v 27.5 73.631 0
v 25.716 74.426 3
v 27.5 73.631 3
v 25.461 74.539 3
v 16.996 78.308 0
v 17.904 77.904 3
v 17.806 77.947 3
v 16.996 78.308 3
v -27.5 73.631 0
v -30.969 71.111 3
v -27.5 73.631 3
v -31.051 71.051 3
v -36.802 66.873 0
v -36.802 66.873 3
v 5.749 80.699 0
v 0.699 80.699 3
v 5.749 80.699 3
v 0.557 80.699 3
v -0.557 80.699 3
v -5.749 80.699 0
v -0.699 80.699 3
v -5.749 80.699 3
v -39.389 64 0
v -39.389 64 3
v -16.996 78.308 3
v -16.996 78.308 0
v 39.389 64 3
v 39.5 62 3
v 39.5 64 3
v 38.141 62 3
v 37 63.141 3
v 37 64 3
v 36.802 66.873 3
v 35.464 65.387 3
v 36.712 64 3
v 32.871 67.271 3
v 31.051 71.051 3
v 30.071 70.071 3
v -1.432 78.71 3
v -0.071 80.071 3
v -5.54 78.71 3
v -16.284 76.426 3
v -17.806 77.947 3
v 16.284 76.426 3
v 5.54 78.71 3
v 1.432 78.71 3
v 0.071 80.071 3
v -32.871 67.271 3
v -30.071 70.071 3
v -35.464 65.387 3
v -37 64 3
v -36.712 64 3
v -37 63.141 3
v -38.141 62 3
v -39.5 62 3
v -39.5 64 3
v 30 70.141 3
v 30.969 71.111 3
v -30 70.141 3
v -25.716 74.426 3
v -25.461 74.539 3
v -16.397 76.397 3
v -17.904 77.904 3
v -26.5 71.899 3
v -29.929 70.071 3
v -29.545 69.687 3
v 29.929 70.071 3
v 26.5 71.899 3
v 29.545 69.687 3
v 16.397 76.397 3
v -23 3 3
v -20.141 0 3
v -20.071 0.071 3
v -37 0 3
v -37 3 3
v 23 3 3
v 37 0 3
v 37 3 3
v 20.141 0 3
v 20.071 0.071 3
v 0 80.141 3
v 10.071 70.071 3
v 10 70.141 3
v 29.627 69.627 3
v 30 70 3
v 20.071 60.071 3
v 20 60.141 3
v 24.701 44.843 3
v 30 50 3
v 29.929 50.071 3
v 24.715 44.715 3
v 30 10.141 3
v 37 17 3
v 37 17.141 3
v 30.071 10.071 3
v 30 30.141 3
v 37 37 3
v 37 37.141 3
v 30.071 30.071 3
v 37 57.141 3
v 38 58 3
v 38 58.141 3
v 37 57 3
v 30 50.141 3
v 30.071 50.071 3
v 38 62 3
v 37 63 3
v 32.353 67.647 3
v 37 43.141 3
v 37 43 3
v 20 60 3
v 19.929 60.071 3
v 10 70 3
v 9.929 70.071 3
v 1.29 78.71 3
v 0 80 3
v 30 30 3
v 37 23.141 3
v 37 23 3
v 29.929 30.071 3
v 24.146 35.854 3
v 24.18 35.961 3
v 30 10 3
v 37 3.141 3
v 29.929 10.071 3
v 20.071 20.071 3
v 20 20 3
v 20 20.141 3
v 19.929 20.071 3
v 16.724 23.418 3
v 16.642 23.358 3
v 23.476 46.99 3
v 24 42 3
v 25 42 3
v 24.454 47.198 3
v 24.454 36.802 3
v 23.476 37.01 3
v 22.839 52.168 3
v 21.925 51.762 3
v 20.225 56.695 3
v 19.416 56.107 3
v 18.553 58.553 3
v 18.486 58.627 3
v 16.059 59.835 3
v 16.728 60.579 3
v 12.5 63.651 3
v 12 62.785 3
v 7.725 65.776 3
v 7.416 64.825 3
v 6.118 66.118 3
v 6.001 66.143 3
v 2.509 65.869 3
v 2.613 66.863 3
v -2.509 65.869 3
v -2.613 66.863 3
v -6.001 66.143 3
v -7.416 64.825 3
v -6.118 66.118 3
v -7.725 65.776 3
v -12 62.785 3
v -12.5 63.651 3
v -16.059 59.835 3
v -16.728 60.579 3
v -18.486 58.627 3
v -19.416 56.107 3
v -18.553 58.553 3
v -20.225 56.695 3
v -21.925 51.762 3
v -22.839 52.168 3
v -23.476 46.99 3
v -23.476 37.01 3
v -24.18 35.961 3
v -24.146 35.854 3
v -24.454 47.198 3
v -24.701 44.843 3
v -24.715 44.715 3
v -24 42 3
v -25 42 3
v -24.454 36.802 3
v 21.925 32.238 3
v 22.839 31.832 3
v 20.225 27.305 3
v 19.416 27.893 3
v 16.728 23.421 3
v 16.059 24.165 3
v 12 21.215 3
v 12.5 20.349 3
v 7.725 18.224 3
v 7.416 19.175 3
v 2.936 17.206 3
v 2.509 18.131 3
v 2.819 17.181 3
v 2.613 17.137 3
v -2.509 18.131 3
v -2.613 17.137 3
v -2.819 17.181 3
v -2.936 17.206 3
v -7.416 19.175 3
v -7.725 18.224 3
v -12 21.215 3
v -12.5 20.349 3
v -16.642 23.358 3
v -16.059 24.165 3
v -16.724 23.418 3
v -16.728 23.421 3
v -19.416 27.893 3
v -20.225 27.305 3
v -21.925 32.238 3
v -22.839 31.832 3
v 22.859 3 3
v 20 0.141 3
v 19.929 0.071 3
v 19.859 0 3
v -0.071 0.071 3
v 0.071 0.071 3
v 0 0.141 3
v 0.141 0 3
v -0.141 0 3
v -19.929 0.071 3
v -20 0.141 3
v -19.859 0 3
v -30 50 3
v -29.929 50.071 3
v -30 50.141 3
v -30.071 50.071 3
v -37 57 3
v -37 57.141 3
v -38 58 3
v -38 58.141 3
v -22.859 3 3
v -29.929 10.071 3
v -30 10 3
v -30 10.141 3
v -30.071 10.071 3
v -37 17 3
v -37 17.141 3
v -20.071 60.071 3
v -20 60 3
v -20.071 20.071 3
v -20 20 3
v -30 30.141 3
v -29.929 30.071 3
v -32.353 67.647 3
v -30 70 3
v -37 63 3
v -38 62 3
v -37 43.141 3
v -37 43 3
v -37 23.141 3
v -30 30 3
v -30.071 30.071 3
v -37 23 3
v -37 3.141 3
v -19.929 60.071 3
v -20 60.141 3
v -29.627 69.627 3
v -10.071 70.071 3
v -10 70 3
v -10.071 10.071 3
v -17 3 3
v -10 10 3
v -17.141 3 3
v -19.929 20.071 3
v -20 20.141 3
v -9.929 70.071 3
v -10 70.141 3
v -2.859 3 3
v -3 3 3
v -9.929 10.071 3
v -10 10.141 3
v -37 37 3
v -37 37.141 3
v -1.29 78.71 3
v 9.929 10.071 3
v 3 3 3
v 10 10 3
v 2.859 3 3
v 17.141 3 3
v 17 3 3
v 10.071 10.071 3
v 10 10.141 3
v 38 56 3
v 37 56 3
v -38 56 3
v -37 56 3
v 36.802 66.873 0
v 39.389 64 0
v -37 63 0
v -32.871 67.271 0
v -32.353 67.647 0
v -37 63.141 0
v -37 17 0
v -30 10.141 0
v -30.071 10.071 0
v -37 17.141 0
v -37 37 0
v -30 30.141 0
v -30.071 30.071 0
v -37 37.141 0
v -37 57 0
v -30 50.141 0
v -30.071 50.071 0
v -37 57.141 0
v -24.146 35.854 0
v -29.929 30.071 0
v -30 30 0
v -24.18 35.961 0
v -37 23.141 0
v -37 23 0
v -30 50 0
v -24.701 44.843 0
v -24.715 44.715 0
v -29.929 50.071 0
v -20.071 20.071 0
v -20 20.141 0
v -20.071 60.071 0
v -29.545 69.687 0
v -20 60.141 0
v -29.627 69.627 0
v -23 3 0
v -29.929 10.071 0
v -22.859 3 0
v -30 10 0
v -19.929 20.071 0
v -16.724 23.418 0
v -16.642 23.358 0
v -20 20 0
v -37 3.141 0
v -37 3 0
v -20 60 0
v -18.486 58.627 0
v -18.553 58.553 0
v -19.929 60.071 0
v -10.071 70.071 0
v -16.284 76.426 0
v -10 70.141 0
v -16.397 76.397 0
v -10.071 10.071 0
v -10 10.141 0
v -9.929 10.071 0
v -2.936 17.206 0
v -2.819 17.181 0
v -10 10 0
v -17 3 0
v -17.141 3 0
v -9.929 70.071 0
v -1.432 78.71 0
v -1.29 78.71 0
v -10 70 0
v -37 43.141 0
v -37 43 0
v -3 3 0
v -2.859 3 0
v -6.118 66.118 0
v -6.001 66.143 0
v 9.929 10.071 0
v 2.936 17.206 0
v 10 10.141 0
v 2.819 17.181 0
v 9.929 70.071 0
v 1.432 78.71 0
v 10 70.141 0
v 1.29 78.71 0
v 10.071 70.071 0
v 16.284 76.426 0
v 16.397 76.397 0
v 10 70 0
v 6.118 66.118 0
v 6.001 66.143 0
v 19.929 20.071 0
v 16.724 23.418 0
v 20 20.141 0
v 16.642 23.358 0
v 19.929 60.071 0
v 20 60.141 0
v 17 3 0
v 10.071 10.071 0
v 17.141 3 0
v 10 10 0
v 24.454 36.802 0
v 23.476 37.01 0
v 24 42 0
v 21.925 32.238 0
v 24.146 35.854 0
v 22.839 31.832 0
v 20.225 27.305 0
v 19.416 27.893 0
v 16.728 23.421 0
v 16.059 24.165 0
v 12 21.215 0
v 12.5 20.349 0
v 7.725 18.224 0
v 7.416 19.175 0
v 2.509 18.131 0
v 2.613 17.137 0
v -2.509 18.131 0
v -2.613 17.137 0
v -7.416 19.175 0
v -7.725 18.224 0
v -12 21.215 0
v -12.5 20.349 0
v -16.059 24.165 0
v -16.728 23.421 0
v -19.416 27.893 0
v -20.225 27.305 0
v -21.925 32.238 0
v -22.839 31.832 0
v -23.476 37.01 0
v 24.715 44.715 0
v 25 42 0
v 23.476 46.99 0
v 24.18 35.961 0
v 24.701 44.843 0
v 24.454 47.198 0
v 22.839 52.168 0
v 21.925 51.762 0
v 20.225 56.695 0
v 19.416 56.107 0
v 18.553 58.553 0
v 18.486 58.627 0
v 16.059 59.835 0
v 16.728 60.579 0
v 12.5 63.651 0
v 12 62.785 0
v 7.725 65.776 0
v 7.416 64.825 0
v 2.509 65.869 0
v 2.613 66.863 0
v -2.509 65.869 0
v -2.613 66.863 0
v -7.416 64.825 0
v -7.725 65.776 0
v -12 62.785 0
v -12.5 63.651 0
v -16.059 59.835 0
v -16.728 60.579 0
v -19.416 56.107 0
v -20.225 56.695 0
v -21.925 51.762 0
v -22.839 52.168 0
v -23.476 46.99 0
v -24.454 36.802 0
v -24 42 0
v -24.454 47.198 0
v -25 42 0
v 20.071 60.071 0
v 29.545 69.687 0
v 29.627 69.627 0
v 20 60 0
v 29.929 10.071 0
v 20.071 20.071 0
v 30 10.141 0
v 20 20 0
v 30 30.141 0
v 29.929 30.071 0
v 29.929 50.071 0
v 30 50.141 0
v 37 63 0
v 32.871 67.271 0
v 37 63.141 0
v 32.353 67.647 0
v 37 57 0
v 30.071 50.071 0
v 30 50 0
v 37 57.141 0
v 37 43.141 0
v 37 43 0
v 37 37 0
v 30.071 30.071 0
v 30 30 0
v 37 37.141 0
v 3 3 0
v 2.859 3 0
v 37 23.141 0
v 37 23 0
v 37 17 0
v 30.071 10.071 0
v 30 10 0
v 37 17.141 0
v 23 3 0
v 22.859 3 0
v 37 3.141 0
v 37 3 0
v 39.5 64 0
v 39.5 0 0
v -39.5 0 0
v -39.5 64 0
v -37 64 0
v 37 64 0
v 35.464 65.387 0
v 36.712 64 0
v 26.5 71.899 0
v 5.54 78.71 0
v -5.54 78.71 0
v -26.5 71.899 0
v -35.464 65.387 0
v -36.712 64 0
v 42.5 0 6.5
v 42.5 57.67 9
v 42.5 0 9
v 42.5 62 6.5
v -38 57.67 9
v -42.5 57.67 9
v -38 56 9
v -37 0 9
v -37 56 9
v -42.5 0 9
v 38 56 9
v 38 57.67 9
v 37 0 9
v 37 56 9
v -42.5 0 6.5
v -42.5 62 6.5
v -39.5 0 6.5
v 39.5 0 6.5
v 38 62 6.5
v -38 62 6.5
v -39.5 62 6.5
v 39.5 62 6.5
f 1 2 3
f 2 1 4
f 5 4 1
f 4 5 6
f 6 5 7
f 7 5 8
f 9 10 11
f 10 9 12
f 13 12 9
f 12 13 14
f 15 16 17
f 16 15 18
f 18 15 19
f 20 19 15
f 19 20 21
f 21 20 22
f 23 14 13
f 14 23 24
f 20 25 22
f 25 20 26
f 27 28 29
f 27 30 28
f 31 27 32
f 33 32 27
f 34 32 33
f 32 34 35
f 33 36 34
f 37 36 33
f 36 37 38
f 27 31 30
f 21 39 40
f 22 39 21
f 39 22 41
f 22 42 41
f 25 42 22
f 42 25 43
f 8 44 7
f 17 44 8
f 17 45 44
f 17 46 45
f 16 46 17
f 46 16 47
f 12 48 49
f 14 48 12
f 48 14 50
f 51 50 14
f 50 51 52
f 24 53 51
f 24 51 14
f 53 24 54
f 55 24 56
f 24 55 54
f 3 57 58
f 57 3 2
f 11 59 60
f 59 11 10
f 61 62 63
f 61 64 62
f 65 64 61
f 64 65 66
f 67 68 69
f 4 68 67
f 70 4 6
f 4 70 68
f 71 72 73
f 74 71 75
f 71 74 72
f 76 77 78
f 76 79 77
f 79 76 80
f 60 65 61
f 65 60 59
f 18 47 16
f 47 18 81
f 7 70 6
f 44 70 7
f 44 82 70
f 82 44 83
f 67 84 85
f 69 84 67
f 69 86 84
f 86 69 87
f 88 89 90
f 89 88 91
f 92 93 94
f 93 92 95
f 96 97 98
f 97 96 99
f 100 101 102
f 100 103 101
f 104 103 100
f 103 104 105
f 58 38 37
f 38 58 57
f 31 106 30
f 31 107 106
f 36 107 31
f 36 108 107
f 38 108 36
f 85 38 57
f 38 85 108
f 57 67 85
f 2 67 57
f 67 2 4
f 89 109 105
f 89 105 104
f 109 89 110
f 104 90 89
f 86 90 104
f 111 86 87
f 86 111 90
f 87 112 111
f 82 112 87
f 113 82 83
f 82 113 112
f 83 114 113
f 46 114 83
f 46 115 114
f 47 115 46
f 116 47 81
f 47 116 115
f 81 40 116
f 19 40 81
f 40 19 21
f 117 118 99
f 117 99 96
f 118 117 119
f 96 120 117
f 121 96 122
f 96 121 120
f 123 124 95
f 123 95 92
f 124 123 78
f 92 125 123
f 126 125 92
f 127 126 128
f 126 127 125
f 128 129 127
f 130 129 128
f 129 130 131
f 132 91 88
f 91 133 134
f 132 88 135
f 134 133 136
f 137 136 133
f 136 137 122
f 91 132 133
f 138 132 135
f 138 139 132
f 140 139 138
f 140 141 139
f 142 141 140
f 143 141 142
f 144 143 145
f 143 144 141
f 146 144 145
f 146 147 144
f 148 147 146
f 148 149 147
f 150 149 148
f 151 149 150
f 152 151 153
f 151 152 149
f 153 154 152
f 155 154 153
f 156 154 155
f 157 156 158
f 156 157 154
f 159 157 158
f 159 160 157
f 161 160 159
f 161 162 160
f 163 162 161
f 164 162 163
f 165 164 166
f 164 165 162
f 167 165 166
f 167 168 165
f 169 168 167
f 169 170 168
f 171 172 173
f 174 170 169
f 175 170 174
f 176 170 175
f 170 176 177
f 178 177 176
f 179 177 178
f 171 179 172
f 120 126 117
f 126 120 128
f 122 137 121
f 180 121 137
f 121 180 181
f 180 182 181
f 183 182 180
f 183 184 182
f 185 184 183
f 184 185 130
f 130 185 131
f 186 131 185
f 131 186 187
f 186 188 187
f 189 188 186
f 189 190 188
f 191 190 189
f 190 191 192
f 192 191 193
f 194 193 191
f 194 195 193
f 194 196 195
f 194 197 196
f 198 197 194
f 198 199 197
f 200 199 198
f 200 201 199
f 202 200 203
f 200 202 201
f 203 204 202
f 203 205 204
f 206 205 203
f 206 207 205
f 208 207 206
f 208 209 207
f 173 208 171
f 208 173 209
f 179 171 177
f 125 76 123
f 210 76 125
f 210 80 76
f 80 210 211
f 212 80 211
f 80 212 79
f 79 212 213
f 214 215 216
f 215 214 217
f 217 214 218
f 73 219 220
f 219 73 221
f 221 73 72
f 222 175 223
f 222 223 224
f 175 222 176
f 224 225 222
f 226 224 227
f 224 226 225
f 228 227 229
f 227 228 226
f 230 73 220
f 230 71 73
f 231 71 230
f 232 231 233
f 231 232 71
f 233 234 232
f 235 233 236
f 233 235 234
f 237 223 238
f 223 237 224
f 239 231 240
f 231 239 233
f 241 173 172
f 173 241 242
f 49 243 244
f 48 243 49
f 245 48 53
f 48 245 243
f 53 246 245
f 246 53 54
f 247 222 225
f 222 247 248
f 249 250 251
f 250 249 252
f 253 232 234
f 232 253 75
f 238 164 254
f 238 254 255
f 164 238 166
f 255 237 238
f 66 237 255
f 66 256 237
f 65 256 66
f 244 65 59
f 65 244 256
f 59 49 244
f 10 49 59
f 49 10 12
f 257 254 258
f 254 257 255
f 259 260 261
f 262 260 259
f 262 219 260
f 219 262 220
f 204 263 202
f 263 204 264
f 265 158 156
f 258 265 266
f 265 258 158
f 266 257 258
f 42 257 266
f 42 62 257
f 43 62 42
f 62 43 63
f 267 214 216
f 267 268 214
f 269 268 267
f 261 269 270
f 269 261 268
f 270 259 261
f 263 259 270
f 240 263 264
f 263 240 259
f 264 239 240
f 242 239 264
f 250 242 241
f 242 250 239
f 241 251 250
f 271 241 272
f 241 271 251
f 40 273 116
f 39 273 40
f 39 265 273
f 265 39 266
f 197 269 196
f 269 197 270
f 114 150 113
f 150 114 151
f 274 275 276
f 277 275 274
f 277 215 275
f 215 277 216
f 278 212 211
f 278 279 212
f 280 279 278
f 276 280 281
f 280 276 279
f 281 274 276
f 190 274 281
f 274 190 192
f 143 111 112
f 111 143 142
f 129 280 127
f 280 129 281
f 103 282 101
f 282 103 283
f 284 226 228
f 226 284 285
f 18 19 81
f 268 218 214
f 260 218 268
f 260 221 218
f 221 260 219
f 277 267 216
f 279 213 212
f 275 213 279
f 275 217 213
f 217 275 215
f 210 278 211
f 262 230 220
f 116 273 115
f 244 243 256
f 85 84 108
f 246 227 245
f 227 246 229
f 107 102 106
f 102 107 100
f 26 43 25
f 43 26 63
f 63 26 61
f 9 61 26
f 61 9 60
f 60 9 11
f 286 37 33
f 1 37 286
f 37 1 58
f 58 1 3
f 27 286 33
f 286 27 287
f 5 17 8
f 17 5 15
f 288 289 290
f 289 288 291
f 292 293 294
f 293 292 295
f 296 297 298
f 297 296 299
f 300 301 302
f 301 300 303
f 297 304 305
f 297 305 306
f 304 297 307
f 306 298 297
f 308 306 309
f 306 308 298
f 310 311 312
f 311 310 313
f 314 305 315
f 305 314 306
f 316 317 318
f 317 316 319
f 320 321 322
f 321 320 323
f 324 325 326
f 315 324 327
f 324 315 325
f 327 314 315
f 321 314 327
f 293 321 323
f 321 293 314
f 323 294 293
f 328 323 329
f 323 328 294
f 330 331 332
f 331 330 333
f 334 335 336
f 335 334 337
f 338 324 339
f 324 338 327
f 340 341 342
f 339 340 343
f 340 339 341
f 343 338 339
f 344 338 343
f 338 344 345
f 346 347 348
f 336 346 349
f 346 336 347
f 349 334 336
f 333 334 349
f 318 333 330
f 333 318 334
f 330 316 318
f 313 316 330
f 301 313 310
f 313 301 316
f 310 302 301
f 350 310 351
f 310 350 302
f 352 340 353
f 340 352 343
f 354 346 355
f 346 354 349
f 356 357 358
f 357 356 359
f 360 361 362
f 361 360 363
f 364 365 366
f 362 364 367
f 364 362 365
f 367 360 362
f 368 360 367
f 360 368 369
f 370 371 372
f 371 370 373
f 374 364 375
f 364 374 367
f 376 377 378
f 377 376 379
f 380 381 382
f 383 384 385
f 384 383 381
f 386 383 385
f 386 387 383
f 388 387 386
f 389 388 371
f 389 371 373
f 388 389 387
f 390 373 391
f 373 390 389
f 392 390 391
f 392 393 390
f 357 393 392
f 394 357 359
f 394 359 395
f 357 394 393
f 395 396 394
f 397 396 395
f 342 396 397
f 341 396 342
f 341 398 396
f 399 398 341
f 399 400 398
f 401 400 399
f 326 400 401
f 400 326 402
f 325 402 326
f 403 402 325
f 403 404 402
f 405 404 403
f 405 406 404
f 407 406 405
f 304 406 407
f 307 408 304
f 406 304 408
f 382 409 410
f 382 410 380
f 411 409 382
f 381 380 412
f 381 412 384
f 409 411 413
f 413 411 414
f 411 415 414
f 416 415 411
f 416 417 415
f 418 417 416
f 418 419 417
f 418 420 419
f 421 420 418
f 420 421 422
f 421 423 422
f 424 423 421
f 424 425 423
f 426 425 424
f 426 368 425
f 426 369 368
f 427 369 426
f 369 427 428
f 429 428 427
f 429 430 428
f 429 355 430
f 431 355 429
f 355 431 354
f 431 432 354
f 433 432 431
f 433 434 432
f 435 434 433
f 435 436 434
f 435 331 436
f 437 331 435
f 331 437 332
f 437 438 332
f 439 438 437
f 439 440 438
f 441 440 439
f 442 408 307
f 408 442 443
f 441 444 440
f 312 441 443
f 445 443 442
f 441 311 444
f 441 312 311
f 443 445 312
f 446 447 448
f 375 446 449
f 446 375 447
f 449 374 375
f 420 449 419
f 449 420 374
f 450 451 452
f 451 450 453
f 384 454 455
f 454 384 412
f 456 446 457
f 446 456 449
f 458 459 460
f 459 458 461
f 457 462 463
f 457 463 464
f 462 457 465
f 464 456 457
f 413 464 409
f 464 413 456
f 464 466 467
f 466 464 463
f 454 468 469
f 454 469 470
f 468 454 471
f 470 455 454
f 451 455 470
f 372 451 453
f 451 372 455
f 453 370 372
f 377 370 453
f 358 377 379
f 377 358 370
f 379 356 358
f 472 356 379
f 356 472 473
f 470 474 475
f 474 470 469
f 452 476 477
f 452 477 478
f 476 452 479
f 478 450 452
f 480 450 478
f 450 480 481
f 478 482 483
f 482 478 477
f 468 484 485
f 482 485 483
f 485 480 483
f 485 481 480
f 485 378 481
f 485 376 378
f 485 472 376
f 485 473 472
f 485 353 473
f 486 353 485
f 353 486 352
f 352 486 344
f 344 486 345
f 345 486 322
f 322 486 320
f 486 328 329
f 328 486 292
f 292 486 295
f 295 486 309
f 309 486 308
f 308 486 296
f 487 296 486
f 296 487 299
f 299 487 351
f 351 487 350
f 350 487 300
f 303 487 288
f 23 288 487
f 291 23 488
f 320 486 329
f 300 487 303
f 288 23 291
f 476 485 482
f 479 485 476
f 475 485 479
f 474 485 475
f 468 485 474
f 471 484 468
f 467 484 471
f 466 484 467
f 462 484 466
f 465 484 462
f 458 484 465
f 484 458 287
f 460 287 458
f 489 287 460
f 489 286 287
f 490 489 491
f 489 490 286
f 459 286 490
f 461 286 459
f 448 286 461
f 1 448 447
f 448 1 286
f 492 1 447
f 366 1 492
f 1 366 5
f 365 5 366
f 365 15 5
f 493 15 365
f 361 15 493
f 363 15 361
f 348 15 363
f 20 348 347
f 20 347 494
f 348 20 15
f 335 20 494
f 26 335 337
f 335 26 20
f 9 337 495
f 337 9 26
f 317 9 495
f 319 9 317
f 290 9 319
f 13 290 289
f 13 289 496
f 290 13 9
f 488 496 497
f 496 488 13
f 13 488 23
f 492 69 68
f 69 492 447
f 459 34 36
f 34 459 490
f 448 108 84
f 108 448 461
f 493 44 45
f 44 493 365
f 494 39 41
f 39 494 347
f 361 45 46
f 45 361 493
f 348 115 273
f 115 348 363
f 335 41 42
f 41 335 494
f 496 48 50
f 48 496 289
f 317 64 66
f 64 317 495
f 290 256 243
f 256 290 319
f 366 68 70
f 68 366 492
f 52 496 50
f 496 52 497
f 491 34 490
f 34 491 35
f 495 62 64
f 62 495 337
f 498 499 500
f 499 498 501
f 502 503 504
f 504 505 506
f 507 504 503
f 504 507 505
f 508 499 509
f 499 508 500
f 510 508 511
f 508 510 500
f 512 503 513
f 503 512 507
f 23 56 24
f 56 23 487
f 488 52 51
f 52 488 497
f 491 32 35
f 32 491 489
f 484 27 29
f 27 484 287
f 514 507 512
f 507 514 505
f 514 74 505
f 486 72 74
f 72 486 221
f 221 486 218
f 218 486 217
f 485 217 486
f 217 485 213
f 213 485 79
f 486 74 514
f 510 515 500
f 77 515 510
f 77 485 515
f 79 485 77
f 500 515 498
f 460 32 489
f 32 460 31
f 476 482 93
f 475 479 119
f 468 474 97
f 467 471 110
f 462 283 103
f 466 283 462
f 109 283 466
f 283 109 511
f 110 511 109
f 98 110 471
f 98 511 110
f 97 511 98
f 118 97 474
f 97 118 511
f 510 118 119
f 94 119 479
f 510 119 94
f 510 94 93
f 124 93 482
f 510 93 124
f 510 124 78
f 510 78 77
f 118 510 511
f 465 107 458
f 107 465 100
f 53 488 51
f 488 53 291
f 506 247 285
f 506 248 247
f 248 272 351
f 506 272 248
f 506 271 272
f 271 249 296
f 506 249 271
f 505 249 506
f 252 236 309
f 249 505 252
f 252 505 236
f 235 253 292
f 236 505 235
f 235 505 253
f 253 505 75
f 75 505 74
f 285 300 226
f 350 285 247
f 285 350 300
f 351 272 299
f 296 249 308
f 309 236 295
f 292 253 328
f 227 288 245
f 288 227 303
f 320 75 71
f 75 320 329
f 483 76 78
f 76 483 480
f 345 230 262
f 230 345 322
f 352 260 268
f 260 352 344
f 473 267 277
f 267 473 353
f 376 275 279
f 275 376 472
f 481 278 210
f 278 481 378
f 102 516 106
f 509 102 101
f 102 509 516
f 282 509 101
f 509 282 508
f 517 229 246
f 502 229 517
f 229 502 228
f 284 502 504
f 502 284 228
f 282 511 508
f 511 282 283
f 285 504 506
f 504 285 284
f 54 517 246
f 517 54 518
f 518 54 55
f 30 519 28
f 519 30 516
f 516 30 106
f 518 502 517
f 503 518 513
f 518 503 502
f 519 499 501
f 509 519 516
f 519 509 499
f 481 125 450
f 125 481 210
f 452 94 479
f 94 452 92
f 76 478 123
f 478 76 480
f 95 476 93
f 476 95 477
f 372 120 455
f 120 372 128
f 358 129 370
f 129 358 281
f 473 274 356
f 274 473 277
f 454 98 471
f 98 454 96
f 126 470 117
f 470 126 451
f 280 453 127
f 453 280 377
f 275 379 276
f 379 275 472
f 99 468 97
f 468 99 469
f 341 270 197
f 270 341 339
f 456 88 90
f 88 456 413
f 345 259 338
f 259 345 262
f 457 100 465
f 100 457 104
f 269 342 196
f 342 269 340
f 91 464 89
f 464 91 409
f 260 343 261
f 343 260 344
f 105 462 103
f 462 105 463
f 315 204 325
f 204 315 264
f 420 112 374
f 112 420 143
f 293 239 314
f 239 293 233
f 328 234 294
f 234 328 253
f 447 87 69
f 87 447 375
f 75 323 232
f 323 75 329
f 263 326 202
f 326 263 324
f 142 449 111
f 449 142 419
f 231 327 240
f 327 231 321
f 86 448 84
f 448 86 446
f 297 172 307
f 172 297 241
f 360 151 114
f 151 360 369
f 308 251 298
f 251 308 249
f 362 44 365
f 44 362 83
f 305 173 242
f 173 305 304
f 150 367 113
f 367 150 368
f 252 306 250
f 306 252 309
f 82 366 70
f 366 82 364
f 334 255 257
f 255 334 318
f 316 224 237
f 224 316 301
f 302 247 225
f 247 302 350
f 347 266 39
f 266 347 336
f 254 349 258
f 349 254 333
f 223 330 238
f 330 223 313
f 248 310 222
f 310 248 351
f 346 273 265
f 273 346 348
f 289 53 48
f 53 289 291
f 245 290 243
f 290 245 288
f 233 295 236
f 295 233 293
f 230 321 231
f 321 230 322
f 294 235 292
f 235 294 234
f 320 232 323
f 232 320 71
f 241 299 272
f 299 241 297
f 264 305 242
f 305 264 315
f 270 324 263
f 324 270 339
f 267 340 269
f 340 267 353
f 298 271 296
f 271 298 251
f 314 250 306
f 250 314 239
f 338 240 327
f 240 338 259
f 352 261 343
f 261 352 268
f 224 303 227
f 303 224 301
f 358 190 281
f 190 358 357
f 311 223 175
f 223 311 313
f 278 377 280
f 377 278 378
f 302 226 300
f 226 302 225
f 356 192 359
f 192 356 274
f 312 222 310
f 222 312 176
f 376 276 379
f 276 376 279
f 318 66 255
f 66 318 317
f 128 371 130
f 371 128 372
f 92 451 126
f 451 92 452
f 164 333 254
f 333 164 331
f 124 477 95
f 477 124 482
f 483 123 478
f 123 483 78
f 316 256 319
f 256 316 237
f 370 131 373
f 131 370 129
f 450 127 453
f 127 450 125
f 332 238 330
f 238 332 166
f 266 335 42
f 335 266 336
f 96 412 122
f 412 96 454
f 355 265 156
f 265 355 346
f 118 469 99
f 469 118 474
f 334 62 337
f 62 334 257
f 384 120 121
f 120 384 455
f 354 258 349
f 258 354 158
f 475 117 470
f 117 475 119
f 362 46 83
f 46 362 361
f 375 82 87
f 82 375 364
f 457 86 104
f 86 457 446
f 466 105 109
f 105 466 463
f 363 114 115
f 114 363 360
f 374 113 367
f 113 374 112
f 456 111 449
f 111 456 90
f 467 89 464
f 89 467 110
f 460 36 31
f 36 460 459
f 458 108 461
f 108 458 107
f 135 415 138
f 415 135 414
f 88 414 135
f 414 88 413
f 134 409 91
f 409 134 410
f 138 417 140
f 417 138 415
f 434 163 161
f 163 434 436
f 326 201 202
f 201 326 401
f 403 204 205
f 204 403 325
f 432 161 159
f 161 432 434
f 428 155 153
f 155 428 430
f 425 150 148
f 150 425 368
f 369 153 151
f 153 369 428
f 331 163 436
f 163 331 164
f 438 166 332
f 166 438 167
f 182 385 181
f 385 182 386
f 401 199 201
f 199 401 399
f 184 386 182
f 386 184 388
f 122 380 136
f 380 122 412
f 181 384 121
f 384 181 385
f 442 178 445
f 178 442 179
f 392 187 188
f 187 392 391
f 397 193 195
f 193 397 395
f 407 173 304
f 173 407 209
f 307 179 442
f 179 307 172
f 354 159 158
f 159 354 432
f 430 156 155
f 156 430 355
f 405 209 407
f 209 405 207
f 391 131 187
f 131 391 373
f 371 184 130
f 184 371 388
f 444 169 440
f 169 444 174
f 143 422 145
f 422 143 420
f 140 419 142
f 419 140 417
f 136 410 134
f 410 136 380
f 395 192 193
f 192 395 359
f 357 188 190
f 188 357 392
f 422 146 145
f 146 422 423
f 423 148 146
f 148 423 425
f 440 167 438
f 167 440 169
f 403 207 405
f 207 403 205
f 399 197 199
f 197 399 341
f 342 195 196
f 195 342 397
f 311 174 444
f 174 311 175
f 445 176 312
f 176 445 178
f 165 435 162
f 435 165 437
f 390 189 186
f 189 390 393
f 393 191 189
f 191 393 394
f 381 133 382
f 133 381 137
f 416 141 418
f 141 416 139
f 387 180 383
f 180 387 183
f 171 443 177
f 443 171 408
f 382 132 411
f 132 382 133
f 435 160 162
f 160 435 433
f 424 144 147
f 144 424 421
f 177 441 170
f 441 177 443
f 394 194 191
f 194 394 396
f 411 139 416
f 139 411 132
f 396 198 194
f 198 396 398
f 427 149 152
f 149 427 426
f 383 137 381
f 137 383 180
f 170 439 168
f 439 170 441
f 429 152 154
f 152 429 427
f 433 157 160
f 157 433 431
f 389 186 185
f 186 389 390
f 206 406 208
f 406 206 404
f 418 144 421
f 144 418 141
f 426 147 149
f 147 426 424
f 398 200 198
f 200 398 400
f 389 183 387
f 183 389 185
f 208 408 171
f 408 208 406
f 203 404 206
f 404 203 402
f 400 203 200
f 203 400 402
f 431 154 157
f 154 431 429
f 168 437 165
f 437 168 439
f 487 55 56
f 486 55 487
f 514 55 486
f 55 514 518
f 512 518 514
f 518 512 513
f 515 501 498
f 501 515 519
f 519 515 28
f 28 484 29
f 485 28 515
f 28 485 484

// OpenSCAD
thickness = 3;

railW = 85;
railH = thickness - 0.5;
railD = 64; // 47 + 17

bodyW = 79;
bodyH = 3;

voidW = 74;

padW = 200;

cutD = 8;

gapH = thickness + 0.5;

filterRad = 25;
potRad = 55;

// rails
difference() {
    union() {
        difference() {
            // solid block of everything
            union() {
                translate([-railW / 2, 0, 0]) {
                    cube([railW, railD, railH + gapH + bodyH]);
                }
                // cylinder
                translate([0, railD - 38, 0]) {
                    difference() {
                        cylinder(r=potRad, h=bodyH);
                        translate([0,0,-1]) {
                            cylinder(r=potRad-2, h=5);
                        }
                    }
                }
            }
           
            // cut out rail void
            translate([-voidW / 2, -1, bodyH]) {
                cube([voidW, railD + 2, railH + gapH + 1]);
            }
            
            // cut out inside void
            translate([-voidW / 2, thickness, -1]) {
                cube([voidW, railD - thickness, railH + gapH + bodyH + 2]);
            }

            // Cut out snap detent
            translate([-voidW / 2 - 1, railD - cutD, bodyH]) {
                cube([voidW + 2, cutD + 1, padW]);
            }

            // cut front of rails
            translate([-padW / 2, railD - 2, bodyH]) {
                cube([padW, padW, padW]);
            }
            
            // make ramp in rails
            translate([-padW / 2, railD - 2, gapH + bodyH]) {
                rotate([60, 0, 0]) {
                    cube([padW, padW, padW]);
                }
            }
        }    

        // ring
        intersection() {
            difference() {
                union() {
                    translate([0, railD + thickness - filterRad, 0]) {
                        cylinder(r=filterRad, h=bodyH);
                    }
                    for(offset=[-padW / 2:20:padW/2]) {
                        translate([0, offset, 0]) {
                            rotate([0, 0, 45]) {
                                translate([-padW / 2, 0, 0]) {
                                    cube([padW, 0.1, bodyH]);
                                }
                            }
                        }
                    }
                    for(offset=[-padW / 2:20:padW/2]) {
                        translate([0, offset, 0]) {
                            rotate([0, 0, -45]) {
                                translate([-padW / 2, 0, 0]) {
                                    cube([padW, 0.1, bodyH]);
                                }
                            }
                        }
                    }
                }
                translate([0, railD + thickness - filterRad, -1]) {
                    cylinder(r=filterRad - 1, h=bodyH + 2);
                }
            }
            translate([0, railD - 38, 0]) {
                cylinder(r=potRad, h=bodyH);
            }
        }
    }

    // Cut out everything past plane
    translate([-padW / 2, -padW, -padW / 2]) {
        cube([padW, padW, padW]);
    }
    
    // cut out from left rail
    translate([-bodyW / 2 - padW, -1, -1]) {
        cube([padW, padW, bodyH + gapH + 1]);
    }

    // cut out from right rail
    translate([bodyW / 2, -1, -1]) {
        cube([padW, padW, bodyH + gapH + 1]);
    }

}
